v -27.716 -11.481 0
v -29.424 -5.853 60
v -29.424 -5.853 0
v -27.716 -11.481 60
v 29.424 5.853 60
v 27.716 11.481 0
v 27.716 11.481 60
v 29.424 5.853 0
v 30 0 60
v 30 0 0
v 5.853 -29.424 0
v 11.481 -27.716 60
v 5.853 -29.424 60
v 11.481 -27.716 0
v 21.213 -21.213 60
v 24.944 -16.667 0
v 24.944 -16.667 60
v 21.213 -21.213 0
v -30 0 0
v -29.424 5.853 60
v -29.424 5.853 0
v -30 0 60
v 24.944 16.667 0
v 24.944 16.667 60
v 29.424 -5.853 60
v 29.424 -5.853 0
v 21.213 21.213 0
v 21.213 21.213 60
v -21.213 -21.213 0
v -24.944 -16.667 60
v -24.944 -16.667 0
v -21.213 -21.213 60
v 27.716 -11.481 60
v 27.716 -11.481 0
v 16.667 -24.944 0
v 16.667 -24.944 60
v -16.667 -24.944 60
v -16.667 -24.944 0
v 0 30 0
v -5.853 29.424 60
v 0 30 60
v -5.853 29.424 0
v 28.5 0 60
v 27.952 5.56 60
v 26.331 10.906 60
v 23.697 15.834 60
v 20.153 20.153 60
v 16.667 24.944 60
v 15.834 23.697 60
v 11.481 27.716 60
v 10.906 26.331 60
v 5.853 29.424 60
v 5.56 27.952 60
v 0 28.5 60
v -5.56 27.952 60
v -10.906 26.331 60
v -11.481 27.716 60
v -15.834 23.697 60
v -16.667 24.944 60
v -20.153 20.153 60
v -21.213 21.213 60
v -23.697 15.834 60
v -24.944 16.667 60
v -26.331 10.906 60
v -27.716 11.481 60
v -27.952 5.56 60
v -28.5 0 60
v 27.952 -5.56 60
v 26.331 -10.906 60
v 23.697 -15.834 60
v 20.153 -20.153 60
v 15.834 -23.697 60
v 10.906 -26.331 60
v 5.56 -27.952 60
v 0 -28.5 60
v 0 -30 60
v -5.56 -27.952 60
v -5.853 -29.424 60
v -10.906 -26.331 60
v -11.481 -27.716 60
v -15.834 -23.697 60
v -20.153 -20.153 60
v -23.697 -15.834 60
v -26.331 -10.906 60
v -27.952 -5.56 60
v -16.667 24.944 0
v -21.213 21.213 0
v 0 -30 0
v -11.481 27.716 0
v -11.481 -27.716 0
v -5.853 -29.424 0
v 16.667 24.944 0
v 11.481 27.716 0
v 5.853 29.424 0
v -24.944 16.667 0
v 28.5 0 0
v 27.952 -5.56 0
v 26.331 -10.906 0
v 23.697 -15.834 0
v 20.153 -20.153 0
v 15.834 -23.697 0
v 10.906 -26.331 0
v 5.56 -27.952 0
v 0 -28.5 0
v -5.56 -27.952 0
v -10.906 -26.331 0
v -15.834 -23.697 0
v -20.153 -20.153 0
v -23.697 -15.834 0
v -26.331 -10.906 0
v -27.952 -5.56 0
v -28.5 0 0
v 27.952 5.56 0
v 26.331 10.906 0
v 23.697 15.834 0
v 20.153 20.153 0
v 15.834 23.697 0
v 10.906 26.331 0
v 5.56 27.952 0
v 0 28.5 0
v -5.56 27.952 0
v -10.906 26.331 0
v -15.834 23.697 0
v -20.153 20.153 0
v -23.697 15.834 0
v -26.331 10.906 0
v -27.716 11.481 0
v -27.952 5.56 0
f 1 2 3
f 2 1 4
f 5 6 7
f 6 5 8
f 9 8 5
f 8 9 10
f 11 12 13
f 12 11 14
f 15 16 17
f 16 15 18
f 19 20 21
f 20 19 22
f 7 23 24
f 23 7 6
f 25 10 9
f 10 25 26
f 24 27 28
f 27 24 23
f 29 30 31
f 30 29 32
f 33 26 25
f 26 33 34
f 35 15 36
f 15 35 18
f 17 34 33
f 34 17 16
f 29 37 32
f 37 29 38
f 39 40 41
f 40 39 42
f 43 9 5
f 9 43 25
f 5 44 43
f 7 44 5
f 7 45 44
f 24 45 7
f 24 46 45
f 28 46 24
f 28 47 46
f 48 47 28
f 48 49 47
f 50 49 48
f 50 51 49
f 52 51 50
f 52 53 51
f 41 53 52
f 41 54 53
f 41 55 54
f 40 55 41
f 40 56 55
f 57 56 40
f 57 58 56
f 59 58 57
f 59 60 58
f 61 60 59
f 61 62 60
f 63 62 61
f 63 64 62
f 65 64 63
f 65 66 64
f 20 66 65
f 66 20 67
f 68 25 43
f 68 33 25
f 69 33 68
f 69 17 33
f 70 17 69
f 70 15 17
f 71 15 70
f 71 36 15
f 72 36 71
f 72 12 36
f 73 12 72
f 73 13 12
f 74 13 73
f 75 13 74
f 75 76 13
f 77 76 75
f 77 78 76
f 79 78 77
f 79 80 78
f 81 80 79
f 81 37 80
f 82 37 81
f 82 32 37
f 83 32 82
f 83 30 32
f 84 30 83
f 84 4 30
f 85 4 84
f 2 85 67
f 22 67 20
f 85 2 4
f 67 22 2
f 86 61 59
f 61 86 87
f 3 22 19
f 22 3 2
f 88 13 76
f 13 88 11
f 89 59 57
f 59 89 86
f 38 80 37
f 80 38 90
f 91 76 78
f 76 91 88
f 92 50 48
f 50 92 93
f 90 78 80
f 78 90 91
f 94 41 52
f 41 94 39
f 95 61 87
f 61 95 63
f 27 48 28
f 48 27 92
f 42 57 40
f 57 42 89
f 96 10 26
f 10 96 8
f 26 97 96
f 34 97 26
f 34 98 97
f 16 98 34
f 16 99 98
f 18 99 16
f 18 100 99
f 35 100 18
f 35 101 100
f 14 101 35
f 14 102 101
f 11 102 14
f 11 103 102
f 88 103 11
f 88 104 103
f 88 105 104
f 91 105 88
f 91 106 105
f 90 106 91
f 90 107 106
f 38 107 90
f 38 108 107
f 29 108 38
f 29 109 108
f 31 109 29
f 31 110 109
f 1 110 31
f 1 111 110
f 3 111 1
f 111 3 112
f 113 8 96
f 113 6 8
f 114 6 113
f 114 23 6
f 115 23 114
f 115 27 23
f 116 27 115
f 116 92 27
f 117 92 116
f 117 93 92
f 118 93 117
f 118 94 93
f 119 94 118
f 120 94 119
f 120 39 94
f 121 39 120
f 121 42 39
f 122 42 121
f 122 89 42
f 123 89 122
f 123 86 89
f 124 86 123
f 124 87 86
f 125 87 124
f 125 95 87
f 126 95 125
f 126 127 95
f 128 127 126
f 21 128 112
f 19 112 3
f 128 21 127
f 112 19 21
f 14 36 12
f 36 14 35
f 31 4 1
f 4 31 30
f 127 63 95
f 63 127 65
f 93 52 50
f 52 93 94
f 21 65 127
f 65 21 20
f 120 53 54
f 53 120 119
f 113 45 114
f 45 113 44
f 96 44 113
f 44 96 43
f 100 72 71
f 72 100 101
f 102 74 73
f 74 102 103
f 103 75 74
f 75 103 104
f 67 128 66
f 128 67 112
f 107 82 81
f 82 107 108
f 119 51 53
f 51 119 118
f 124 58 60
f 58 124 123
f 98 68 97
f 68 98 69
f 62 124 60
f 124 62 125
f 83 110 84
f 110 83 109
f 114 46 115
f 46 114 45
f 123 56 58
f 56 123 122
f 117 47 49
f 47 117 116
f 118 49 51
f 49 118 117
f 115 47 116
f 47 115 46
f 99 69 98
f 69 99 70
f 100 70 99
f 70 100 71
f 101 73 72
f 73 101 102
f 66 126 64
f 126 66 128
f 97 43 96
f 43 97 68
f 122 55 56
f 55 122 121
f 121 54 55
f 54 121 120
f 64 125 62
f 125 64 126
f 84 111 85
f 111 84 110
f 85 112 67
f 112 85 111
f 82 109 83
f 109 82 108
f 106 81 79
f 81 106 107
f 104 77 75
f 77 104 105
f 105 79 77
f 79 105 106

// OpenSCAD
$fn = 32;

// ----------------------------------------------------------------------
// Thin tube: 1.5 mm wall
// ----------------------------------------------------------------------

// --- parameters (mm) ---
tube_od = 60;             // outer diameter
tube_h = 60;              // height, Z
wall = 1.5;               // wall thickness

difference() {
  cylinder(h = tube_h, d = tube_od);
  translate([0, 0, -1]) cylinder(h = tube_h + 2, d = tube_od - 2 * wall);
}
